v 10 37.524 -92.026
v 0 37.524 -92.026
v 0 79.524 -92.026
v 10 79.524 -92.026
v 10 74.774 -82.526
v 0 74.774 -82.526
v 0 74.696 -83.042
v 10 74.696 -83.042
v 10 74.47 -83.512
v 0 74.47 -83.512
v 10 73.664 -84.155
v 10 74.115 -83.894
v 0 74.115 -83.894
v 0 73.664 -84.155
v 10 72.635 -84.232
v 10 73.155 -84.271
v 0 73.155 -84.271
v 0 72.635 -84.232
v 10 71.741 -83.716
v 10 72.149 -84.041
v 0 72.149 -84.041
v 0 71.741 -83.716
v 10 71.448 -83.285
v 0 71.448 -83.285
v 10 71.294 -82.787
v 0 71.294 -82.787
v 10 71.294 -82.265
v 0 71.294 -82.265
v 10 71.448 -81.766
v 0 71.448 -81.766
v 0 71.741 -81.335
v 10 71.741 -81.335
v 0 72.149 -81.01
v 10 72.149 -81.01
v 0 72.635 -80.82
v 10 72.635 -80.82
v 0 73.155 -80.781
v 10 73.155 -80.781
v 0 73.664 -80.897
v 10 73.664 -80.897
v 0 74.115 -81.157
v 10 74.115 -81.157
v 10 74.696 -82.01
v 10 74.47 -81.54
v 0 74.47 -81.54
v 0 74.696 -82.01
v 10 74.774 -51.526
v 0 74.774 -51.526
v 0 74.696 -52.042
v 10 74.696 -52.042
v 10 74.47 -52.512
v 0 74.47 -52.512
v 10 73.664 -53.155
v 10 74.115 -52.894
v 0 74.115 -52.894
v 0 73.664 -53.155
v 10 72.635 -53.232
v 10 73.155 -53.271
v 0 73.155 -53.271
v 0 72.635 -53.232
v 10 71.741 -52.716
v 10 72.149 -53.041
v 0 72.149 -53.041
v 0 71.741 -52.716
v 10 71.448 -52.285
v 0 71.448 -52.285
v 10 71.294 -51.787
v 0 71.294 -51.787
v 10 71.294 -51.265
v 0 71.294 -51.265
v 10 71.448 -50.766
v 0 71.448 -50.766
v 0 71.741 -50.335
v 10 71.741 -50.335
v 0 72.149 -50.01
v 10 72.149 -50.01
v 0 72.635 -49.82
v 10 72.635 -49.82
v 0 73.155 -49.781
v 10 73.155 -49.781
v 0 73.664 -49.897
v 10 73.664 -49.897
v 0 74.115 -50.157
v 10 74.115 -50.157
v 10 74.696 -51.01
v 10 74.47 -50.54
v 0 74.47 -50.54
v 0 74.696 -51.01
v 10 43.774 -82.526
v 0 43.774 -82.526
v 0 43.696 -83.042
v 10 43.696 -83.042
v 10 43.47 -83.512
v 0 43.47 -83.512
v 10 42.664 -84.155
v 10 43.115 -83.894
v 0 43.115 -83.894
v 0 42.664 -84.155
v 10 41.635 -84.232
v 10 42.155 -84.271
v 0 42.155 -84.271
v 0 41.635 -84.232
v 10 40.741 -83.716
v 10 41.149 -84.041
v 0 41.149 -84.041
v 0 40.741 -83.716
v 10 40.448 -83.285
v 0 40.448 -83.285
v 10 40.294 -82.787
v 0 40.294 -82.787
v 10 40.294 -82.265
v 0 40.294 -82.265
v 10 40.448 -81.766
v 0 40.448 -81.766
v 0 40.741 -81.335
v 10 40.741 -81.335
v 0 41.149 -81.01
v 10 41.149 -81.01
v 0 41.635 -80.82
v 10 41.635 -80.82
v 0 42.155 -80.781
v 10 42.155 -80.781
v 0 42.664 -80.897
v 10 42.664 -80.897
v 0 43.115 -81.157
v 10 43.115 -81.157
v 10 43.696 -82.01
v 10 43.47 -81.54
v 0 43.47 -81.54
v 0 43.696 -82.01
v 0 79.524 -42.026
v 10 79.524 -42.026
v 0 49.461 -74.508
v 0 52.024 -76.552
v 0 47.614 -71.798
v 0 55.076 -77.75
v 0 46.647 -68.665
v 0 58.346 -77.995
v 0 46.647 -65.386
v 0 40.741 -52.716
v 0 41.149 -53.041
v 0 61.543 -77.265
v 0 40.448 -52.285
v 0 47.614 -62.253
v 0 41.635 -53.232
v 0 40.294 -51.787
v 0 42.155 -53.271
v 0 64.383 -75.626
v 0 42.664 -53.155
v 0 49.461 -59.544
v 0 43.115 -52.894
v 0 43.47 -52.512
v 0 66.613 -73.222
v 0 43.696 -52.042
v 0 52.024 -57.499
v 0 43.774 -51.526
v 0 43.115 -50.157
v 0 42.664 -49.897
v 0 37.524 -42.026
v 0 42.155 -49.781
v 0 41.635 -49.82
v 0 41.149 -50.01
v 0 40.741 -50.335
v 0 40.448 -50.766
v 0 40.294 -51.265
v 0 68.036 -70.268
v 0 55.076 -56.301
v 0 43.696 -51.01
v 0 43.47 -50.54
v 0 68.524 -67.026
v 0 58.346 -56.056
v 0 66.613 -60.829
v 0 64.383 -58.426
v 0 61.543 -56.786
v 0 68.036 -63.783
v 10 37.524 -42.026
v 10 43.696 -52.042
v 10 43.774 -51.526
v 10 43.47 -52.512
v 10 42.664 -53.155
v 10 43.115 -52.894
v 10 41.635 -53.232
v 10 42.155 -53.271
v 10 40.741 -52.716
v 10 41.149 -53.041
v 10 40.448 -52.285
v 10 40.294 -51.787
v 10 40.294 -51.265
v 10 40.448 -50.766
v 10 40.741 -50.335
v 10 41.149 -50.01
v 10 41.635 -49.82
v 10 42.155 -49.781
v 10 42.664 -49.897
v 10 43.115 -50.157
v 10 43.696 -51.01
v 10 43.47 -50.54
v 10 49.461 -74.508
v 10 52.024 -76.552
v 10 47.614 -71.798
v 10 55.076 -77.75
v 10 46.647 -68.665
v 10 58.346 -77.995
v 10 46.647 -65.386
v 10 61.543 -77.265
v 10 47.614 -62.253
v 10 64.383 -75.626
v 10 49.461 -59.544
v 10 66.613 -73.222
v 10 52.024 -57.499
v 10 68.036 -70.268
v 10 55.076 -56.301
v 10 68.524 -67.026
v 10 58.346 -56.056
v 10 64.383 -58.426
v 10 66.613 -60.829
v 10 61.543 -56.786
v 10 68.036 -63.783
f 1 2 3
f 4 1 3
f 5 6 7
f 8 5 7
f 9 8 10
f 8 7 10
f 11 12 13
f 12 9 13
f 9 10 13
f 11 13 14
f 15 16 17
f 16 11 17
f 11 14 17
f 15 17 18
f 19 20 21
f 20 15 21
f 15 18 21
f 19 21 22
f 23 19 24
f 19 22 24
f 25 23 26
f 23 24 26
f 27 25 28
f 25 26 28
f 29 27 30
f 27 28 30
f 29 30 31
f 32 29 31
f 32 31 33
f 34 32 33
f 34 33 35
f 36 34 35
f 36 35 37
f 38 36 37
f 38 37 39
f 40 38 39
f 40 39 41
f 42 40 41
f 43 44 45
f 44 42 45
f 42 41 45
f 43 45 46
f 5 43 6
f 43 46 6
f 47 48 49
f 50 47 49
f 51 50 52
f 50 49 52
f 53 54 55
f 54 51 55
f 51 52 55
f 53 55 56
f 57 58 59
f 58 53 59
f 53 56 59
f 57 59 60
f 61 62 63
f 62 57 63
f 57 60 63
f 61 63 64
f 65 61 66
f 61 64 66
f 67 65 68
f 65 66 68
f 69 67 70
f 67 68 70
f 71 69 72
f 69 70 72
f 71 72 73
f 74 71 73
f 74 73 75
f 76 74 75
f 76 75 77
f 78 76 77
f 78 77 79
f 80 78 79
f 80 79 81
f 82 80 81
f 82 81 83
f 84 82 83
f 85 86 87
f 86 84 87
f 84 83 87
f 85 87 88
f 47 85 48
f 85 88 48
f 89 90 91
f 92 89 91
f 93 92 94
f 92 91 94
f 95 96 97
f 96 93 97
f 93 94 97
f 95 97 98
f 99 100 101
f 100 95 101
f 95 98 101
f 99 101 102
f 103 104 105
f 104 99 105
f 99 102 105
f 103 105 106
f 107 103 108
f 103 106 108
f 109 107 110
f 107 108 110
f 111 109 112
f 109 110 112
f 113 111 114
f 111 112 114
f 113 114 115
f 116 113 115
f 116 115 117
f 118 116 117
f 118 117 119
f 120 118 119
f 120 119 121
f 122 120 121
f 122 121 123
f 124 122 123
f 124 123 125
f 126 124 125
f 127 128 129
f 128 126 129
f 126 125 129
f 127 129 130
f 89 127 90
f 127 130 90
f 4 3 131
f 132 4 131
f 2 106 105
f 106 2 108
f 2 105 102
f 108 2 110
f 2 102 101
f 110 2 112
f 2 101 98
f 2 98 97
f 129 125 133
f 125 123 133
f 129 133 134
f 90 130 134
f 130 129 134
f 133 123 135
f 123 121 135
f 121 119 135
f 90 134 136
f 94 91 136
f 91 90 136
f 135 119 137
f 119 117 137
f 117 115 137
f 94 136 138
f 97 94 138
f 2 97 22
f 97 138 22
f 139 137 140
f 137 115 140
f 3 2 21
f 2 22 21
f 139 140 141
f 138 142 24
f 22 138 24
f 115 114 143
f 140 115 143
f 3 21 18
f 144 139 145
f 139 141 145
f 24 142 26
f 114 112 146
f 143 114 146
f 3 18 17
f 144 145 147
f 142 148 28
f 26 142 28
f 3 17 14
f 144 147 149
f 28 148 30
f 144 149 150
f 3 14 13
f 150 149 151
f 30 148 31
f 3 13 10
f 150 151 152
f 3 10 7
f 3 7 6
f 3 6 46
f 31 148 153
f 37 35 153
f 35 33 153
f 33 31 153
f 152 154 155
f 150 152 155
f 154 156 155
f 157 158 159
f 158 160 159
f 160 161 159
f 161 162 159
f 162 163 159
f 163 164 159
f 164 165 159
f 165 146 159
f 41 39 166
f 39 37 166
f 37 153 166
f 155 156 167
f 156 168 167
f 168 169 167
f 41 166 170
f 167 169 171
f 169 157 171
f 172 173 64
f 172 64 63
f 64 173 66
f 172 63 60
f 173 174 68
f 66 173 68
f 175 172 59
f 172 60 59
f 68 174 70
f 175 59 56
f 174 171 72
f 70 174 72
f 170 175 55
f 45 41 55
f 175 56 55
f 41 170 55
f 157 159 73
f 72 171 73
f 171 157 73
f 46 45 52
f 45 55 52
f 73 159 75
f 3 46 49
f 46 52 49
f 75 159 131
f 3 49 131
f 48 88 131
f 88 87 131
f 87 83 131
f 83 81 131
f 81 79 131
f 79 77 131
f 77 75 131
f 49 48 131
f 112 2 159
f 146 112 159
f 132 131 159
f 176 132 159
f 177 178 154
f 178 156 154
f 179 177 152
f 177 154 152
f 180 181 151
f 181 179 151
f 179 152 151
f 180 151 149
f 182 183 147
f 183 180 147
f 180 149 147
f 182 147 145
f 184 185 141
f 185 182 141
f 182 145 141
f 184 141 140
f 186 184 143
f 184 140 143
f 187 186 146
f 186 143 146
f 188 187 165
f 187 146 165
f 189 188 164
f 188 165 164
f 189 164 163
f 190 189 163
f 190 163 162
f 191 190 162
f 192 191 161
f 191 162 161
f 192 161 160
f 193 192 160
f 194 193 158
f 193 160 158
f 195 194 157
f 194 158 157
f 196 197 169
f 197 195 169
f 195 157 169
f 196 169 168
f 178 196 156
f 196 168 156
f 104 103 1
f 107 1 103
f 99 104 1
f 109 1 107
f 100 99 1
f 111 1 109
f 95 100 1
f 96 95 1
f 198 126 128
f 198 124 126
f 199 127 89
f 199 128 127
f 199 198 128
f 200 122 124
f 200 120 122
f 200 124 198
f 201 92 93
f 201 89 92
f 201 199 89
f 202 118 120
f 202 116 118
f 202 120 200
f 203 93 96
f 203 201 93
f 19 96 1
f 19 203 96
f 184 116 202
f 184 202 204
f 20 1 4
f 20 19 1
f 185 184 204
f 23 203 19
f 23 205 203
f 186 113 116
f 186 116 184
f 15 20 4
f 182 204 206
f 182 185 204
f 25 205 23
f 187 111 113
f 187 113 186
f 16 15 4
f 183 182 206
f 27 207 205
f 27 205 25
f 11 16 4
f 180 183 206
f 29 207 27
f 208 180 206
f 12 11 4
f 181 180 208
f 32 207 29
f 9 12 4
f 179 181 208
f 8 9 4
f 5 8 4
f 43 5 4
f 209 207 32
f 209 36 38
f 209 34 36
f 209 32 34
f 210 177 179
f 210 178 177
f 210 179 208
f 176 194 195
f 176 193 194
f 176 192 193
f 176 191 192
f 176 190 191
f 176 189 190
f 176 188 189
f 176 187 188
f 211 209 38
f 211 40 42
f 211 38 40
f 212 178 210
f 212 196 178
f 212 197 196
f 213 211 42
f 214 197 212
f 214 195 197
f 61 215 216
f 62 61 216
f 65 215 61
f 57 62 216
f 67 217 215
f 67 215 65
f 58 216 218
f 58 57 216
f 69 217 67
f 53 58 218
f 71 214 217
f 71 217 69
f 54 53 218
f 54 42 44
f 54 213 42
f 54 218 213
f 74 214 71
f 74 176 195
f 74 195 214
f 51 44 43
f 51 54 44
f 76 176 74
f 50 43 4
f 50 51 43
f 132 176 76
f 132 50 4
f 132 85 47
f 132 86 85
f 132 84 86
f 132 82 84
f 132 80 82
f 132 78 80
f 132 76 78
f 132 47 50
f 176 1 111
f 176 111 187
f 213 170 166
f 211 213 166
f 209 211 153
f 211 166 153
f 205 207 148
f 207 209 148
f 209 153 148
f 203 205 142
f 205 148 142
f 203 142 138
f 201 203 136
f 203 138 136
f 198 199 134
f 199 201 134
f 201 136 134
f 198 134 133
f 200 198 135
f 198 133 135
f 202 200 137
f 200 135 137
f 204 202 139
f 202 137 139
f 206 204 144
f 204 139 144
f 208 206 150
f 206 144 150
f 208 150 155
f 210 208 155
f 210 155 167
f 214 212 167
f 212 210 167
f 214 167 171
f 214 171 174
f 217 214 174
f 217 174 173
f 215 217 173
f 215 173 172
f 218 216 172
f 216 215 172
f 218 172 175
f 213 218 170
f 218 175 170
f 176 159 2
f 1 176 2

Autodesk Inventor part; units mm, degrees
ref_plane "YZ Plane" through (0, 0, 0) normal (1, 0, 0) x (0, 1, 0)
ref_plane "XZ Plane" through (0, 0, 0) normal (0, 1, 0) x (-1, 0, 0)
ref_plane "XY Plane" through (0, 0, 0) normal (0, 0, 1) x (1, 0, 0)
sketch "Schizzo1" plane through (0, 0, 0) normal (1, 0, 0) x (0, 1, 0)
  circle A0 centre (57.5242, -67.0257) radius 11
  line L0 (37.5242, -92.0257) -> (79.5242, -92.0257)
  line L1 (79.5242, -92.0257) -> (79.5242, -42.0257)
  line L2 (79.5242, -42.0257) -> (37.5242, -42.0257)
  line L3 (37.5242, -42.0257) -> (37.5242, -92.0257)
  circle A1 centre (42.0242, -82.5257) radius 1.75
  circle A2 centre (42.0242, -51.5257) radius 1.75
  circle A3 centre (73.0242, -51.5257) radius 1.75
  circle A4 centre (73.0242, -82.5257) radius 1.75
  point P0 (0, 0)
  point P1 (79.5242, -67.0257)
  dimension "d0" = 22
  dimension "d1" = 42
  dimension "d2" = 50
  dimension "d4" = 31
  dimension "d5" = 31
  dimension "d6" = 15.5
  dimension "d7" = 31
  dimension "d8" = 31
  dimension "d9" = 0
  dimension "d10" = 15.5
  dimension "d11" = 0
  dimension "d12" = 3.5
  dimension "d13" = 3.5
  dimension "d14" = 3.5
  dimension "d15" = 3.5
  dimension "d16" = 22
  dimension "d17" = 25
extrude "Estrusione1" add sketch "Schizzo1" along normal blind 10
equation "\"d5\" = d4"
equation "\"d6\" = 0.5 * d4"
equation "\"d7\" = d4"
equation "\"d8\" = d4"
equation "\"d10\" = 0.5 * d4"
equation "\"d13\" = d12"
equation "\"d14\" = d12"
equation "\"d15\" = d12"
equation "\"d17\" = 0.5 * d2"
properties part number "staffa motore"
